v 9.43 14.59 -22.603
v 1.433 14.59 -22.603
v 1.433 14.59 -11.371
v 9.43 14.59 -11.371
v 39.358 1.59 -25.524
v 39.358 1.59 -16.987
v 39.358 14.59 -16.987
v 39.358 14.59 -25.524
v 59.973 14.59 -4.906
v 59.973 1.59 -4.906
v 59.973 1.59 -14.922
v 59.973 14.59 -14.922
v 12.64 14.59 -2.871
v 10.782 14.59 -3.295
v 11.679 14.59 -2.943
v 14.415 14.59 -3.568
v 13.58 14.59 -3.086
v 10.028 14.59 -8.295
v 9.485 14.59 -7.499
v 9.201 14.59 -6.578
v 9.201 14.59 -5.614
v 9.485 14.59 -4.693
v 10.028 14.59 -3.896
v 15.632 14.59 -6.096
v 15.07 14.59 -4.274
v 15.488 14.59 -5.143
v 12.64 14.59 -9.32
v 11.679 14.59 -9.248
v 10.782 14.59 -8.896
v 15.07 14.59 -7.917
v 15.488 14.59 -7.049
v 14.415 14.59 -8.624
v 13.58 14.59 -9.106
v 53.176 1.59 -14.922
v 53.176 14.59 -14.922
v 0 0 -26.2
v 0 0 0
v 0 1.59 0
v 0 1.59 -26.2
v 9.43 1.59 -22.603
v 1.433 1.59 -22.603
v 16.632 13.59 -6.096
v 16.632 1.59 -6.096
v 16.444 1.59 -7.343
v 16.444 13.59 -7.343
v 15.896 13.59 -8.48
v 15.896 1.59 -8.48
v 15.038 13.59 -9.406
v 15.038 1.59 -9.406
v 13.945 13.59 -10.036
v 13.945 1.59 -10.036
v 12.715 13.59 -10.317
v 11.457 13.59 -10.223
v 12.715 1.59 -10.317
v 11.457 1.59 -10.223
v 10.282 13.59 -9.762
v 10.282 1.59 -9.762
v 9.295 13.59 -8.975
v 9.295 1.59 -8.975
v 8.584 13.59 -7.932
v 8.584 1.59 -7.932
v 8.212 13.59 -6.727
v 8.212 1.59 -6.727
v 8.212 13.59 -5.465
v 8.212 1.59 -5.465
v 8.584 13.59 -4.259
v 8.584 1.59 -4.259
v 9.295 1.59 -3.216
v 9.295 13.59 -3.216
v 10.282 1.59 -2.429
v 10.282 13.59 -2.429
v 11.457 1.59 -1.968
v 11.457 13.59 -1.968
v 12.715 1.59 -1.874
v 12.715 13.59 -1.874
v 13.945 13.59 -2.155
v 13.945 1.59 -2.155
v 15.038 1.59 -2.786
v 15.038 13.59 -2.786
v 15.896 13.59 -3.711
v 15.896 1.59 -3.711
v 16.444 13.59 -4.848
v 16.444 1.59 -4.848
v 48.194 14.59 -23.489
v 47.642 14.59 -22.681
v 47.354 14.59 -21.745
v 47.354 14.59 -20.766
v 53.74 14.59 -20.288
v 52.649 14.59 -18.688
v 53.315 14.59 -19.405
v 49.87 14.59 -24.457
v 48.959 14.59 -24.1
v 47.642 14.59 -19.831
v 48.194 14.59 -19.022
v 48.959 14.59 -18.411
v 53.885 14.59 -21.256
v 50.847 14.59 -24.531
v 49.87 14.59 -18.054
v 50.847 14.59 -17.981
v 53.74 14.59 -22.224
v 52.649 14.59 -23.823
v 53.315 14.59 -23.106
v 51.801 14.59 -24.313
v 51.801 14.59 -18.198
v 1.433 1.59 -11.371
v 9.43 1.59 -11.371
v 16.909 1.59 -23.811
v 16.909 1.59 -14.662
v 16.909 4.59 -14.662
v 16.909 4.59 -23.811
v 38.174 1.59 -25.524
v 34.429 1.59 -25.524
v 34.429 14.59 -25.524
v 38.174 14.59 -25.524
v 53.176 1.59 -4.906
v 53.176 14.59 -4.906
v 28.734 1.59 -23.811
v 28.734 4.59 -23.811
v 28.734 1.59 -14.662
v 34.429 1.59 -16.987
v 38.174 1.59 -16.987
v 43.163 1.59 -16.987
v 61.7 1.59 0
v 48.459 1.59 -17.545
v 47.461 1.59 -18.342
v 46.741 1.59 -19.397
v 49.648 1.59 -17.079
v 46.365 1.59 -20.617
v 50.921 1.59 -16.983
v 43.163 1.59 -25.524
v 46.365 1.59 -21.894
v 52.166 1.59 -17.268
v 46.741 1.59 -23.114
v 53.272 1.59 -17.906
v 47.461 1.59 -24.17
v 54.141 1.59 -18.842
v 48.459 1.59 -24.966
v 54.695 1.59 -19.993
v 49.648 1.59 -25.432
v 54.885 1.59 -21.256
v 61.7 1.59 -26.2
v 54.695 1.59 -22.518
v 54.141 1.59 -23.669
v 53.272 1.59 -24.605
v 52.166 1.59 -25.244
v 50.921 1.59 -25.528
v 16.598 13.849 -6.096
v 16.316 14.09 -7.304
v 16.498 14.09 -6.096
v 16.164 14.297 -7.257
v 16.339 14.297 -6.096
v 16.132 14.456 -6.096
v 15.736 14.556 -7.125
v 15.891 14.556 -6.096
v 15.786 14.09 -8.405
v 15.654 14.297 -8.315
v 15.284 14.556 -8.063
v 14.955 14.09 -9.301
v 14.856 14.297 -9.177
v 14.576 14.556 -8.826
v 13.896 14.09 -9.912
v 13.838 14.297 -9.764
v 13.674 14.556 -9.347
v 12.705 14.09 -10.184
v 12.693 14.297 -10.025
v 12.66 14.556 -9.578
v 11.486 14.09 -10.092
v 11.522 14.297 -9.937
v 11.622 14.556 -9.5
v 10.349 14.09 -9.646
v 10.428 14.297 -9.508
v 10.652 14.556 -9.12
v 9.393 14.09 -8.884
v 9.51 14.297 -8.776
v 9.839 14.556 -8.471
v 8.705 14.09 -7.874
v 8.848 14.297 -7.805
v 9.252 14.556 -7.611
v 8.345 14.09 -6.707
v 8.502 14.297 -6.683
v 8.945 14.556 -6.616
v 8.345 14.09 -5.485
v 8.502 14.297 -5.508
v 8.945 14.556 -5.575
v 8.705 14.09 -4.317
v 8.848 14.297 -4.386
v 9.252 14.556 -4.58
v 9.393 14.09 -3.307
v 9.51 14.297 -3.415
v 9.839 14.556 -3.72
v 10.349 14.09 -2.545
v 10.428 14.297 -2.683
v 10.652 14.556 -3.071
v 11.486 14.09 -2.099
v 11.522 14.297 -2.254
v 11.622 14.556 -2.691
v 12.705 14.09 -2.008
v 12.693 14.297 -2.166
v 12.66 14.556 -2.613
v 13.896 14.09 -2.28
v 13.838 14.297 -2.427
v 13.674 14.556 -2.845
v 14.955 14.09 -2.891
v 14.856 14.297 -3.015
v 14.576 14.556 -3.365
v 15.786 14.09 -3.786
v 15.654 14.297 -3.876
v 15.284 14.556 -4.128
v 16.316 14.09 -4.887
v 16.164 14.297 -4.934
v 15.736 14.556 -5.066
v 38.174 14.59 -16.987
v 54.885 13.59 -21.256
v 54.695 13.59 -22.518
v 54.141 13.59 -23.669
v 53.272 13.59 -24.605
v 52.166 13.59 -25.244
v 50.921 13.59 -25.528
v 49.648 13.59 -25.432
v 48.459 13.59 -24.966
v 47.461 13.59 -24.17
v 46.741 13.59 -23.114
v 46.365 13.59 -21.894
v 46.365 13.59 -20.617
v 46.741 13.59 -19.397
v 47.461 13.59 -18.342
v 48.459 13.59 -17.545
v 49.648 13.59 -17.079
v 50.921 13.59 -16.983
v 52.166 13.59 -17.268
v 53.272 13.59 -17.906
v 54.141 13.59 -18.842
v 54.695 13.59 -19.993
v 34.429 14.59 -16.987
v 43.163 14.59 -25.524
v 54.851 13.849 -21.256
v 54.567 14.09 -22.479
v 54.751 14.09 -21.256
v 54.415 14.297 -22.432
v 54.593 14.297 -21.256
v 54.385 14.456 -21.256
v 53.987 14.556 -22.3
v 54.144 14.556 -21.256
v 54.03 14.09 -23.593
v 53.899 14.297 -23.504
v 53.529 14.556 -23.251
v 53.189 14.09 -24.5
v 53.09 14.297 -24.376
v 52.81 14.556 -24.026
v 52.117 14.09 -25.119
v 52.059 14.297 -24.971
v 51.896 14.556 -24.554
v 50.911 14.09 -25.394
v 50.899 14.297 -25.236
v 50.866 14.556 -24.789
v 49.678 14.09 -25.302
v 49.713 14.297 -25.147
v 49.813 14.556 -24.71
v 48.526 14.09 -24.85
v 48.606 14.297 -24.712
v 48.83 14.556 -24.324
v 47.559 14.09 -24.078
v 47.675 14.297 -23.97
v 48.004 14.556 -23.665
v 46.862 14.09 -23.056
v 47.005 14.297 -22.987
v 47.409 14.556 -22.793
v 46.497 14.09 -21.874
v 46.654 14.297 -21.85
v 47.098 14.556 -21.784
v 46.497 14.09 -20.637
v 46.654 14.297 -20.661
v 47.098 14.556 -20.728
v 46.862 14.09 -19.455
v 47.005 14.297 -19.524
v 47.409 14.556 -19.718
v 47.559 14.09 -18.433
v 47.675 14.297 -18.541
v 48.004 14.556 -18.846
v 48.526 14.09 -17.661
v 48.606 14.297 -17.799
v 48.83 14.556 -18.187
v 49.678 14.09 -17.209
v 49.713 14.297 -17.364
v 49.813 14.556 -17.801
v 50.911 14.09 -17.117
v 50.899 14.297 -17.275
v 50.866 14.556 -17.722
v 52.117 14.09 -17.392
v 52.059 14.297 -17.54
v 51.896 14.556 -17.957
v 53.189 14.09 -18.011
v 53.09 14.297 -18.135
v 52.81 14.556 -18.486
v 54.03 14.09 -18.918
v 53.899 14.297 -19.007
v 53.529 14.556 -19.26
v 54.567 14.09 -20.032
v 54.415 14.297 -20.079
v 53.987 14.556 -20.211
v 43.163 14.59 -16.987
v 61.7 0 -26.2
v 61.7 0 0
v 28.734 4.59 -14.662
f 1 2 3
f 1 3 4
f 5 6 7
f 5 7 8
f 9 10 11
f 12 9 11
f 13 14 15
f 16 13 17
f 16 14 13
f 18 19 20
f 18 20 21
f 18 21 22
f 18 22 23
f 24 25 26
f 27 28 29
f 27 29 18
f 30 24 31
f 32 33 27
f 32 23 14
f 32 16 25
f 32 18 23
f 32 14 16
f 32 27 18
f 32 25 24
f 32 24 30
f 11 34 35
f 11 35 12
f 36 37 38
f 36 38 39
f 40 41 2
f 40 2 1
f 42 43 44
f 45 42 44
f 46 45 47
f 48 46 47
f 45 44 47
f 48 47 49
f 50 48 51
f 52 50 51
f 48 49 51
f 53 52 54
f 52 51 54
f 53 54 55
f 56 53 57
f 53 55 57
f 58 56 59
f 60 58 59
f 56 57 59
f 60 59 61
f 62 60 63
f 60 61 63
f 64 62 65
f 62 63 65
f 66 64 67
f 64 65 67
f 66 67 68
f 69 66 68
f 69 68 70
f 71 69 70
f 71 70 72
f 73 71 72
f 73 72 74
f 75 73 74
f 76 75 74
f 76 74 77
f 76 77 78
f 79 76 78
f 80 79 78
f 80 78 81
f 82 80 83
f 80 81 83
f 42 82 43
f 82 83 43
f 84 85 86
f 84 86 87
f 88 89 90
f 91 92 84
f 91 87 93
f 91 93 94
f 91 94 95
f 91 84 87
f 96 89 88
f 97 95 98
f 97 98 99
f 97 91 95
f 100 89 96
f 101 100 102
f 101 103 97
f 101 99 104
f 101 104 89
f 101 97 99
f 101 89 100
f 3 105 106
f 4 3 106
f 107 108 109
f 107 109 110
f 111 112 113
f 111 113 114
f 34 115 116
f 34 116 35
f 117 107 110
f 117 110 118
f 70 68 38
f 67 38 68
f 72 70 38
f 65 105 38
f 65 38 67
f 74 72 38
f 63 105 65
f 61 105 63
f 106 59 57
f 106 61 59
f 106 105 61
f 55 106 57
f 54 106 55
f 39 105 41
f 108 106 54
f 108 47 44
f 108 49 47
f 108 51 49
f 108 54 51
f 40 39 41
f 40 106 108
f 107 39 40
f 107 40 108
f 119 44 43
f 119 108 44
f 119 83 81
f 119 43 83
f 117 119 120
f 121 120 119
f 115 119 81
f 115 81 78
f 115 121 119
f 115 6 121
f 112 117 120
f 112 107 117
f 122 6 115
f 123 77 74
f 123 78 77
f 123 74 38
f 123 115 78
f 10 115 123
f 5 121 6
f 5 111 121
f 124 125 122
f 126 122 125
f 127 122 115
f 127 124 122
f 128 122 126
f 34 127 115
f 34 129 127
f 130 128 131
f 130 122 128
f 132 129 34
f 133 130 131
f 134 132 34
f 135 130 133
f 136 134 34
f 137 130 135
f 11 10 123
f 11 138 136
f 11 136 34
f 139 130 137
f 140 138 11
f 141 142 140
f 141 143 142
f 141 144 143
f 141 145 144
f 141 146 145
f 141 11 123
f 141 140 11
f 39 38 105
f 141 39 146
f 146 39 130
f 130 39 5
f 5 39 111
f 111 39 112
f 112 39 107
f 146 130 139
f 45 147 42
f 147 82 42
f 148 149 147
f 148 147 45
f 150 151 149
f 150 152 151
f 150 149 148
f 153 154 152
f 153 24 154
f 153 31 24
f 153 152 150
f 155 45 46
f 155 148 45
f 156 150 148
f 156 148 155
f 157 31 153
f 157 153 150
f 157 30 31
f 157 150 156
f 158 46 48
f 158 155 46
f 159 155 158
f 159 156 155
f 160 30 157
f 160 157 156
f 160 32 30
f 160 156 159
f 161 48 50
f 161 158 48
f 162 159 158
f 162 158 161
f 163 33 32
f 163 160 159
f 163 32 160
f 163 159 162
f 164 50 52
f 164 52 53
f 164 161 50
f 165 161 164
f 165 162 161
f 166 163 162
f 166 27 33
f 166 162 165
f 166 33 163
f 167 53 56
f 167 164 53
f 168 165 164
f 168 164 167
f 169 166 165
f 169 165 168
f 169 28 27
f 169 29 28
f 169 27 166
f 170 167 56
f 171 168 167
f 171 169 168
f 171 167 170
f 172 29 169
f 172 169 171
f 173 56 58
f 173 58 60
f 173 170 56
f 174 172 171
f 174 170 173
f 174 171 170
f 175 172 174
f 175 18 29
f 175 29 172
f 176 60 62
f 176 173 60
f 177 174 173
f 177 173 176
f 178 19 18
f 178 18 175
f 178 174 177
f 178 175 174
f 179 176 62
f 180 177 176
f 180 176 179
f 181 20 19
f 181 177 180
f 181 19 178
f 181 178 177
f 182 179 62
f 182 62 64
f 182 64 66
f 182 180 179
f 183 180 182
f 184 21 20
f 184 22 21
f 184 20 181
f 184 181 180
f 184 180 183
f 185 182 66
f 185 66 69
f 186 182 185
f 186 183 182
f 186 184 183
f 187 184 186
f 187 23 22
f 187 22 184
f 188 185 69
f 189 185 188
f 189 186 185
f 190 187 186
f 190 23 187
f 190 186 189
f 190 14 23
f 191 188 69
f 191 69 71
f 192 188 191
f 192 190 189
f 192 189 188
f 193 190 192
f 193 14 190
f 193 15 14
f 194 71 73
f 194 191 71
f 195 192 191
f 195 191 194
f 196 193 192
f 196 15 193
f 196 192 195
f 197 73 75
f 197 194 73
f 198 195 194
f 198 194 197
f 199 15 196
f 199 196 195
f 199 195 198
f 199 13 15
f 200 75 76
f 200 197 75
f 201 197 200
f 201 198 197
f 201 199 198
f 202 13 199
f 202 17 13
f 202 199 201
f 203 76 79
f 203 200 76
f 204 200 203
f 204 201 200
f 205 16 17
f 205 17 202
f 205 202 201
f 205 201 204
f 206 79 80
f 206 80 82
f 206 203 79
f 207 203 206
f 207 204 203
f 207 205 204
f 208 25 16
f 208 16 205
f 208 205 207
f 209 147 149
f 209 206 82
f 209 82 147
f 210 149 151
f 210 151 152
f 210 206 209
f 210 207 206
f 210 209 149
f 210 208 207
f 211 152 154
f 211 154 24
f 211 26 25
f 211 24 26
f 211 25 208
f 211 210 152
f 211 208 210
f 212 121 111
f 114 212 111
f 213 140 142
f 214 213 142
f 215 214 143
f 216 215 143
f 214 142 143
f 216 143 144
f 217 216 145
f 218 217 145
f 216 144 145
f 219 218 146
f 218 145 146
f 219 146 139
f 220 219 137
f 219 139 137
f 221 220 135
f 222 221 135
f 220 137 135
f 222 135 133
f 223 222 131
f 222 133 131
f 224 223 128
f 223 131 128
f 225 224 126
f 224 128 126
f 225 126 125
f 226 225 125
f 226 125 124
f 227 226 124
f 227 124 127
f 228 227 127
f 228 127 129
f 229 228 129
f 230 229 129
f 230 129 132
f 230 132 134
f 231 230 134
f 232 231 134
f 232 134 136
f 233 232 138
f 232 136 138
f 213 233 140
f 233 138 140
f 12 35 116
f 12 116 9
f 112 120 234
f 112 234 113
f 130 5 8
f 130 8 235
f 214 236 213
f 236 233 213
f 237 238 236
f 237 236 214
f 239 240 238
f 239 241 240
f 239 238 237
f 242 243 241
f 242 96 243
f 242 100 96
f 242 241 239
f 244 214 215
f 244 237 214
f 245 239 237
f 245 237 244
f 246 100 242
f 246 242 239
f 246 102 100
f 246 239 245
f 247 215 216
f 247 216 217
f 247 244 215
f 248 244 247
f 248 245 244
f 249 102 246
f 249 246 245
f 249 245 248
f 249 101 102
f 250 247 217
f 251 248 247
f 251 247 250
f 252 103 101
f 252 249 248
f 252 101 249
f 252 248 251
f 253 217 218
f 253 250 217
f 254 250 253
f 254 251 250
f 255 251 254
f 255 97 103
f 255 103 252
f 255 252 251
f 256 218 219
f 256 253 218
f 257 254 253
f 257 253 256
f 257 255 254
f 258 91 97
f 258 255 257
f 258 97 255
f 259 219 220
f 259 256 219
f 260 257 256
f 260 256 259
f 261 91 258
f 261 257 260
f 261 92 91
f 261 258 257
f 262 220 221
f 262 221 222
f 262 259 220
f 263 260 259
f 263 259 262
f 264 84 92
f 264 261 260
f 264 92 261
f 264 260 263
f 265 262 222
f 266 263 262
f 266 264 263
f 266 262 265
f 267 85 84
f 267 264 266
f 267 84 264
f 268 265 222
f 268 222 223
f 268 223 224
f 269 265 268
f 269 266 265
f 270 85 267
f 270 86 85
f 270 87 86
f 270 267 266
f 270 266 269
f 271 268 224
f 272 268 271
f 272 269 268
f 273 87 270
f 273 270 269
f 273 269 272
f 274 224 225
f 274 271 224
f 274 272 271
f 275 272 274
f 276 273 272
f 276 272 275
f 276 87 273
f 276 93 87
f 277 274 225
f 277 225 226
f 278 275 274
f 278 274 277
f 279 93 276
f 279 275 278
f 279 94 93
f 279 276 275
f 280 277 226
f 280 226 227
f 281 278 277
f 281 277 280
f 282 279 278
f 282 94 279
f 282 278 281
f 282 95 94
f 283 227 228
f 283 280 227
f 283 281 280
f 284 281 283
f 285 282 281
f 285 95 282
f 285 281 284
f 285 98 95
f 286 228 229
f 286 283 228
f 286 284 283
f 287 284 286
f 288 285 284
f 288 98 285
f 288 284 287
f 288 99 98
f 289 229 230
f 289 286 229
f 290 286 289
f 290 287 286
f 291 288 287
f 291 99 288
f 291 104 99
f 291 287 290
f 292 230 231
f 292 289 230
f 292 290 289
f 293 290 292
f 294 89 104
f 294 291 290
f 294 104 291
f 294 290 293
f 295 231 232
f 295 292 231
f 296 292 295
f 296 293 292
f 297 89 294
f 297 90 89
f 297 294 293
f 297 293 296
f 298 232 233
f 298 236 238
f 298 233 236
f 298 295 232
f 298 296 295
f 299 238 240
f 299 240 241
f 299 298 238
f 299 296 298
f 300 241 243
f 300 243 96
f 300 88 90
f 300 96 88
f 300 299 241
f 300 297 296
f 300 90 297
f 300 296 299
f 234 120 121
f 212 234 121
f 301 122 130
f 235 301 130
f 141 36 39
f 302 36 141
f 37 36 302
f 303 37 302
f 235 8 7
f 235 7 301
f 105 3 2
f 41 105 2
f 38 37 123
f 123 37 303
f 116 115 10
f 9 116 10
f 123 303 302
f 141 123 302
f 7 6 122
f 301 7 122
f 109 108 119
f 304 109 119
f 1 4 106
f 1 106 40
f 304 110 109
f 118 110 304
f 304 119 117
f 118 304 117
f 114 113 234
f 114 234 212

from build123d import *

# Parameters (mm, degrees)
SKETCH1_W           = 61.7
SKETCH1_H           = 26.2
BOSS_EXTRUDE1_DEPTH = 1.59
SKETCH2_R           = 4.284216932
SKETCH2_R_2         = 4.233461823
SKETCH2_W           = 7.996291091
SKETCH2_H           = 11.231630152
SKETCH2_W_2         = 6.79740416
SKETCH2_H_2         = 10.015433833
SKETCH2_W_3         = 3.744475554
SKETCH2_H_3         = 8.537740598
SKETCH2_W_4         = 3.804793914
BOSS_EXTRUDE2_DEPTH = 13
FILLET1_R           = 1
SKETCH3_W           = 11.824805187
SKETCH3_H           = 9.14941117
BOSS_EXTRUDE3_DEPTH = 3


with BuildPart() as part:
    # Sketch1 → Boss-Extrude1 (new body)
    with BuildSketch(Plane(origin=(0, 0, 0), x_dir=(1, 0, 0), z_dir=(0, 1, 0))):
        with Locations((30.85, 13.1)):
            Rectangle(SKETCH1_W, SKETCH1_H)
    extrude(amount=BOSS_EXTRUDE1_DEPTH)

    # Sketch2 → Boss-Extrude2 (add)
    with BuildSketch(Plane(origin=(0, 1.59, 0), x_dir=(1, 0, 0), z_dir=(0, 1, 0))):
        with Locations((50.601195051, 21.255565251)):
            Circle(SKETCH2_R)
        with Locations((12.398624263, 6.095655225)):
            Circle(SKETCH2_R_2)
        with Locations((5.431373533, 16.986694952)):
            Rectangle(SKETCH2_W, SKETCH2_H)
        with Locations((56.574526606, 9.914115999)):
            Rectangle(SKETCH2_W_2, SKETCH2_H_2)
        with Locations((36.301503569, 21.255565251)):
            Rectangle(SKETCH2_W_3, SKETCH2_H_3)
        with Locations((41.260345926, 21.255565251)):
            Rectangle(SKETCH2_W_4, SKETCH2_H_3)
    extrude(amount=BOSS_EXTRUDE2_DEPTH)

    # Fillet1
    fillet1_edges = [part.edges().sort_by_distance(p)[0] for p in [
        (46.316978119, 14.59, -21.255565251),
        (8.16516244, 14.59, -6.095655225),
    ]]
    fillet(fillet1_edges, radius=FILLET1_R)

    # Sketch3 → Boss-Extrude3 (add)
    with BuildSketch(Plane(origin=(0, 1.59, 0), x_dir=(1, 0, 0), z_dir=(0, 1, 0))):
        with Locations((22.821277789, 19.236524015)):
            Rectangle(SKETCH3_W, SKETCH3_H)
    extrude(amount=BOSS_EXTRUDE3_DEPTH)


solid = part.part
